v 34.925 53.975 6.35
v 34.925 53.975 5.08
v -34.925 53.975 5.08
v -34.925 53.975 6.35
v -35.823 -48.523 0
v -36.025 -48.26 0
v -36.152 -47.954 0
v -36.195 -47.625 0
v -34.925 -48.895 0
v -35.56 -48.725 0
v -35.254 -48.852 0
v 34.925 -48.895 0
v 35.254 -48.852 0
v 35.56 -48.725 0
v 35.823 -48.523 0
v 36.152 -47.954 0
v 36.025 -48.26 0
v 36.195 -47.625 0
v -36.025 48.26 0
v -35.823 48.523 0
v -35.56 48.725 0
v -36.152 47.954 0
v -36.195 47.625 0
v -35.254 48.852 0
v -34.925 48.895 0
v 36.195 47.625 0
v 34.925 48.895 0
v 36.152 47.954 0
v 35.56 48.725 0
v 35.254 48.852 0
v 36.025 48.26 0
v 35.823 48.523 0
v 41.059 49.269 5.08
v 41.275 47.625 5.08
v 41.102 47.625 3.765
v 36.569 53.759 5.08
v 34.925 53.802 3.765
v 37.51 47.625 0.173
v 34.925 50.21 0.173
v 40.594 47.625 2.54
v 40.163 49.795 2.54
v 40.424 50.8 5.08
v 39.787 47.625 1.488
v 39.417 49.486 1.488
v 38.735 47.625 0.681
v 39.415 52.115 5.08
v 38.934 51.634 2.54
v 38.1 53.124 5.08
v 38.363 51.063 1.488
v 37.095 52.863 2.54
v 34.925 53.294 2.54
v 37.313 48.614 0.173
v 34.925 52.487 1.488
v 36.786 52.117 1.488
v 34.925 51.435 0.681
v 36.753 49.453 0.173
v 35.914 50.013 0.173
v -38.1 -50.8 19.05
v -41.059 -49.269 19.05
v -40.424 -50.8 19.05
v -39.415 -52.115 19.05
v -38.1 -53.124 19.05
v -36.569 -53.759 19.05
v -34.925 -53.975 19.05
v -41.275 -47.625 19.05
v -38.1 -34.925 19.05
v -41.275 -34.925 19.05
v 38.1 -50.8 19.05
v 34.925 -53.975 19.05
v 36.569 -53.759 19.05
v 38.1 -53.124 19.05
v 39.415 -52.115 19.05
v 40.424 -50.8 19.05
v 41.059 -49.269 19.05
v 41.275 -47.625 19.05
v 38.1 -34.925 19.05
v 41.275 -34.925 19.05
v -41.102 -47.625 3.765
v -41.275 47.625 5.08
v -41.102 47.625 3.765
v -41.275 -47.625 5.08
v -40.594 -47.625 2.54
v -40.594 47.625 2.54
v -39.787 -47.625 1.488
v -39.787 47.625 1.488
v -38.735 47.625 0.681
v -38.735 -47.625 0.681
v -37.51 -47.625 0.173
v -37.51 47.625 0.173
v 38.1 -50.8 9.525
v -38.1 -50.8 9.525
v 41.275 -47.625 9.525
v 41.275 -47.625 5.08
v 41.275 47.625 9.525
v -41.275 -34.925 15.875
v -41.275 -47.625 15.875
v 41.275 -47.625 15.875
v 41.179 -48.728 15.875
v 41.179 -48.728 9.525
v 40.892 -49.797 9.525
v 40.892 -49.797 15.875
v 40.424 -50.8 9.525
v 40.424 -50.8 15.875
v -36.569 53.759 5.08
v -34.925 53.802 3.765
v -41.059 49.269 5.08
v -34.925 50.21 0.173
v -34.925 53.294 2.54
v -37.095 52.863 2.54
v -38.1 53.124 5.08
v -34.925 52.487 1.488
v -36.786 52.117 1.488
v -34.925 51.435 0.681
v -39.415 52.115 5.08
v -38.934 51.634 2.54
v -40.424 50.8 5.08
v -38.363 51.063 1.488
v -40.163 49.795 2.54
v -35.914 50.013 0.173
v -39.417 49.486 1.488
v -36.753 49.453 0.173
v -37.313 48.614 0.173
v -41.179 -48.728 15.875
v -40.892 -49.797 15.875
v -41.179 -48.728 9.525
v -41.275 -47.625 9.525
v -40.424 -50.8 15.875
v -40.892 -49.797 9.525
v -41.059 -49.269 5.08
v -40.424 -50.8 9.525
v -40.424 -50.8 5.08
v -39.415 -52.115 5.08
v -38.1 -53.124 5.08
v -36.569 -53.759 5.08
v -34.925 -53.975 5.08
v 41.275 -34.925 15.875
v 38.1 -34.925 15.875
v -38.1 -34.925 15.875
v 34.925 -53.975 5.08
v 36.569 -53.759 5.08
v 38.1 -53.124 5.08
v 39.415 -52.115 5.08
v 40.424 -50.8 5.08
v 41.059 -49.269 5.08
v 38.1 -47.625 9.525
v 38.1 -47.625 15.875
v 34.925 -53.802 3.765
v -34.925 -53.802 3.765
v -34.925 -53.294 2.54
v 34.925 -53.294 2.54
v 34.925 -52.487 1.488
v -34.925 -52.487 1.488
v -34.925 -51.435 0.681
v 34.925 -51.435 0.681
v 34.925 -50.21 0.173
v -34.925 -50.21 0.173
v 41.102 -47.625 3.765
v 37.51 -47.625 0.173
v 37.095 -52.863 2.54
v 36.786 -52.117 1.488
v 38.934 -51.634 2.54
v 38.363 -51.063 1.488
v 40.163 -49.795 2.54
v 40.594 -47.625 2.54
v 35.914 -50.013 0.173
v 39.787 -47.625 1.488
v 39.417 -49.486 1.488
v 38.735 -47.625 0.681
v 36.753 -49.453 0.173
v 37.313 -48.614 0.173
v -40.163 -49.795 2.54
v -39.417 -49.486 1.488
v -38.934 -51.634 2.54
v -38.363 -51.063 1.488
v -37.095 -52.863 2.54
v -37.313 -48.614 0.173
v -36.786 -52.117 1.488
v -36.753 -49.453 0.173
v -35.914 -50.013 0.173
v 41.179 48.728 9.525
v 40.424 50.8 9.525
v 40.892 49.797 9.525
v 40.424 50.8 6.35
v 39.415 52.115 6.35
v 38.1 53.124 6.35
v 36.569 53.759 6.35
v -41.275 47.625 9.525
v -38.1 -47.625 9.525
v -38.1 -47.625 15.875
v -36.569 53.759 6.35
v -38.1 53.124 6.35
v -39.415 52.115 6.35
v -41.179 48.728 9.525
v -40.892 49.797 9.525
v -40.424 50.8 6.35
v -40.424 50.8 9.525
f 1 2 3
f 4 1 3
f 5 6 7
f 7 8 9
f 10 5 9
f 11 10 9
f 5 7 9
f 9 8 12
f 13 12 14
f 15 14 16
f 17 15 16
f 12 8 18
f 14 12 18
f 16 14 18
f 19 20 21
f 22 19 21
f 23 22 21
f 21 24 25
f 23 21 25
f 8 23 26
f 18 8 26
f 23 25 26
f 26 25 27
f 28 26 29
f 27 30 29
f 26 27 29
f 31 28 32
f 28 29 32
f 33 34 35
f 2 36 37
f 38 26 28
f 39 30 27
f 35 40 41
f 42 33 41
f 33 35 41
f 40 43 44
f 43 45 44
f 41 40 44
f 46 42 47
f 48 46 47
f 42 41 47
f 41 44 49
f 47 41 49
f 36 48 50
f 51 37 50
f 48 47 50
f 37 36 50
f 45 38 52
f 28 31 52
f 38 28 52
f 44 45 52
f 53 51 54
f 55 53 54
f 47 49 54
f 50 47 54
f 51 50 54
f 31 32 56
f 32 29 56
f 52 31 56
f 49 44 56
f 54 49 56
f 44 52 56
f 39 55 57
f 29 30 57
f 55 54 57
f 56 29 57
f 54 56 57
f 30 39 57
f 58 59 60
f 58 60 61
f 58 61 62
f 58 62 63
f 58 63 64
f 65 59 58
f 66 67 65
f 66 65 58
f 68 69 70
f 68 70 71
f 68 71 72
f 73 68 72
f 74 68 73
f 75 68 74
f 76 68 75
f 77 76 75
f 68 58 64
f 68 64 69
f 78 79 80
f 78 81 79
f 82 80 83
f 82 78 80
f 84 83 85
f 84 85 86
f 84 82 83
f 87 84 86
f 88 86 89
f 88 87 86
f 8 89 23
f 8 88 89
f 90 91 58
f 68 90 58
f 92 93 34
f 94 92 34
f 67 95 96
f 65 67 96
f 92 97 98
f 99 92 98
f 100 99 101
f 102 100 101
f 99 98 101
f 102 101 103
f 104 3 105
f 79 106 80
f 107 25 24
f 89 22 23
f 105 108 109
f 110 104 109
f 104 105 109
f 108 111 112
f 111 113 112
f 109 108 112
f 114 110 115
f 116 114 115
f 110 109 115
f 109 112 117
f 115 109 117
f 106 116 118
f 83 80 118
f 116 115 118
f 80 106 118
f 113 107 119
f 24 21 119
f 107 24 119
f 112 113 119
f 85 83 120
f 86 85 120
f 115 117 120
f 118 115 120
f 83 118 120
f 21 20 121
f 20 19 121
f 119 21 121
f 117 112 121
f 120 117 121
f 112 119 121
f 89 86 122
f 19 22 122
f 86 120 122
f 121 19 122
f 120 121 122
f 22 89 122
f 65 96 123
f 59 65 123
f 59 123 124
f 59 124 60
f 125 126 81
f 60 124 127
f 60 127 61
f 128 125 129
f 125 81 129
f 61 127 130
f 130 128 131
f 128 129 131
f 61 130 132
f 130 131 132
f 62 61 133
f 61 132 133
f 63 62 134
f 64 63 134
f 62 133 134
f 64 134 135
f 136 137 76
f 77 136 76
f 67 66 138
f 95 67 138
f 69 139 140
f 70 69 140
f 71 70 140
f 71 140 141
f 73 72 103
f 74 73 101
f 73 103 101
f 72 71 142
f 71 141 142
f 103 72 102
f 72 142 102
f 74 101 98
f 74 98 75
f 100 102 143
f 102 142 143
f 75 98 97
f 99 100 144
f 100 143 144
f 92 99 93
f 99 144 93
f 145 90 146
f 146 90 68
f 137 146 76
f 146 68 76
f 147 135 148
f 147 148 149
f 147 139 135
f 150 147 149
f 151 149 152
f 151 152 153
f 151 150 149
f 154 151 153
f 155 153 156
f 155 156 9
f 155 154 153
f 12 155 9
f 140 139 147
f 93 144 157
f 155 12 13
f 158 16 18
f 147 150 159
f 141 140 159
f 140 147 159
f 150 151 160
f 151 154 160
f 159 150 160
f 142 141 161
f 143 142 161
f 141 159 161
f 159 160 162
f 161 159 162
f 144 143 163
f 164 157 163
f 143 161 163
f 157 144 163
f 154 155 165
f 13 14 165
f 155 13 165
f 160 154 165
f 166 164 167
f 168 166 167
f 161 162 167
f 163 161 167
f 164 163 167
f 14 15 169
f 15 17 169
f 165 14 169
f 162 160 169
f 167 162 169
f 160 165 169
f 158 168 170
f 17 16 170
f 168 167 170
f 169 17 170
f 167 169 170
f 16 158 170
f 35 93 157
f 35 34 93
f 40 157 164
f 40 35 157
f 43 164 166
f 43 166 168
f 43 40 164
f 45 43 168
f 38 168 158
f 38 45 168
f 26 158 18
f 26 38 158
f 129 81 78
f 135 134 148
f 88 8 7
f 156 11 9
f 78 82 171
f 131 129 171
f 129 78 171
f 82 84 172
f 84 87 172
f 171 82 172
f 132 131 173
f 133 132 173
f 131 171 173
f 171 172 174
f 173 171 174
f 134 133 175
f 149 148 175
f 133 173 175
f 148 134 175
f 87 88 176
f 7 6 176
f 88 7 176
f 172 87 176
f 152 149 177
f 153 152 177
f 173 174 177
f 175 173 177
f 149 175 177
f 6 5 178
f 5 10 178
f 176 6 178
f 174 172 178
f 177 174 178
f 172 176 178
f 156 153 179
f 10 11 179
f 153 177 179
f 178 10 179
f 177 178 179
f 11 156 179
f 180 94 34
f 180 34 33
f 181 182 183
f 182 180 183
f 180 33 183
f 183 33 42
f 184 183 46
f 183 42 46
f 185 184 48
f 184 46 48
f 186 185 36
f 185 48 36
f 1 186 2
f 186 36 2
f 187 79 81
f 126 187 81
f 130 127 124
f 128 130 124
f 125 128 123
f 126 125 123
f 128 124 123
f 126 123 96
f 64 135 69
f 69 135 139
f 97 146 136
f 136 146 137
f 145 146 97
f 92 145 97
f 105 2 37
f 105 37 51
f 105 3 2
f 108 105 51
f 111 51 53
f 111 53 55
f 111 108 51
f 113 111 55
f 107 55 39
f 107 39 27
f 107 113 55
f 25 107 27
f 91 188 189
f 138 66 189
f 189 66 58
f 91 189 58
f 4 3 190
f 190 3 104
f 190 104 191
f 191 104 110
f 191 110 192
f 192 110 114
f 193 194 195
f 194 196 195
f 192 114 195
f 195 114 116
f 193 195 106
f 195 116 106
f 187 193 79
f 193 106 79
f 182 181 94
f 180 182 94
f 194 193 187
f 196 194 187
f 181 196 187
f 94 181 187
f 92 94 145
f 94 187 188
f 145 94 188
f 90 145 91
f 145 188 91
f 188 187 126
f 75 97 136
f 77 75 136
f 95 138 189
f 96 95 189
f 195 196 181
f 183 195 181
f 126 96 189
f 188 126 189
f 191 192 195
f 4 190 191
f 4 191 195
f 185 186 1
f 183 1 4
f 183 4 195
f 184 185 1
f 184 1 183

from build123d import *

# Parameters (mm, degrees)
F1_DEPTH  = 19.05
F2_R      = 5.08
F3_W      = 76.2
F3_H      = 101.6
F4_DEPTH  = 9.525
F6_DEPTH  = 12.7
F8_DEPTH  = 25.4
F10_DEPTH = 3.175
F12_DEPTH = 6.35
F14_DEPTH = 6.35


with BuildPart() as f1:
    # F0 (on Top) → F1 (new body)
    with BuildSketch(Plane.XY):
        with BuildLine():
            ThreePointArc((41.275, 47.625), (39.4151280605, 52.1151280605), (34.925, 53.975))
            Line((34.925, 53.975), (-34.925, 53.975))
            ThreePointArc((-34.925, 53.975), (-39.4151280605, 52.1151280605), (-41.275, 47.625))
            Line((-41.275, 47.625), (-41.275, -47.625))
            ThreePointArc((-41.275, -47.625), (-39.4151280605, -52.1151280605), (-34.925, -53.975))
            Line((-34.925, -53.975), (34.925, -53.975))
            ThreePointArc((34.925, -53.975), (39.4151280605, -52.1151280605), (41.275, -47.625))
            Line((41.275, -47.625), (41.275, 47.625))
        make_face()
    extrude(amount=F1_DEPTH)

    # F2
    f2_edges = [f1.edges().sort_by_distance(p)[0] for p in [
        (0, -53.975, 0),
    ]]
    fillet(f2_edges, radius=F2_R)

    # F3 (on face) → F4 (cut)
    with BuildSketch(Plane.XY.offset(19.05)):
        Rectangle(F3_W, F3_H)
    extrude(amount=-F4_DEPTH, mode=Mode.SUBTRACT)

    # F5 (on face) → F6 (cut)
    with BuildSketch(Plane.XY.offset(19.05)):
        with BuildLine():
            ThreePointArc((-34.925, 53.975), (-38.1, 53.124261314), (-40.424261314, 50.8))
            Line((-40.424261314, 50.8), (-38.1, 50.8))
            Line((-38.1, 50.8), (38.1, 50.8))
            Line((38.1, 50.8), (40.424261314, 50.8))
            ThreePointArc((40.424261314, 50.8), (38.1, 53.124261314), (34.925, 53.975))
            Line((34.925, 53.975), (-34.925, 53.975))
        make_face()
    extrude(amount=-F6_DEPTH, mode=Mode.SUBTRACT)

    # F7 (on face) → F8 (cut)
    with BuildSketch(Plane(origin=(38.1, 0, 0), x_dir=(0, -1, 0), z_dir=(-1, 0, 0))):
        Polygon((34.925, 15.875), (34.925, 19.05), (-50.8, 19.05), (-50.8, 9.525), (50.8, 9.525), (50.8, 15.875), align=None)
    extrude(amount=-F8_DEPTH, mode=Mode.SUBTRACT)

    # F9 (on face) → F10 (cut)
    with BuildSketch(Plane.YZ.offset(-38.1)):
        Polygon((50.8, 19.05), (-34.925, 19.05), (-34.925, 15.875), (-50.8, 15.875), (-50.8, 9.525), (50.8, 9.525), align=None)
    extrude(amount=-F10_DEPTH, mode=Mode.SUBTRACT)

    # F11 (on face) → F12 (join)
    with BuildSketch(Plane(origin=(0, 0, 15.875), x_dir=(1, 0, 0), z_dir=(0, 0, -1))):
        with BuildLine():
            Line((38.1, 47.625), (41.275, 47.625))
            ThreePointArc((41.275, 47.625), (41.0586289969, 49.2685009364), (40.424261314, 50.8))
            Line((40.424261314, 50.8), (38.1, 50.8))
            Line((38.1, 50.8), (38.1, 47.625))
        make_face()
    extrude(amount=F12_DEPTH)

    # F13 (on face) → F14 (join)
    with BuildSketch(Plane(origin=(0, 0, 15.875), x_dir=(1, 0, 0), z_dir=(0, 0, -1))):
        with BuildLine():
            ThreePointArc((-40.424261314, 50.8), (-41.0586289969, 49.2685009364), (-41.275, 47.625))
            Line((-41.275, 47.625), (-38.1, 47.625))
            Line((-38.1, 47.625), (-38.1, 50.8))
            Line((-38.1, 50.8), (-40.424261314, 50.8))
        make_face()
    extrude(amount=F14_DEPTH)


solid = f1.part
